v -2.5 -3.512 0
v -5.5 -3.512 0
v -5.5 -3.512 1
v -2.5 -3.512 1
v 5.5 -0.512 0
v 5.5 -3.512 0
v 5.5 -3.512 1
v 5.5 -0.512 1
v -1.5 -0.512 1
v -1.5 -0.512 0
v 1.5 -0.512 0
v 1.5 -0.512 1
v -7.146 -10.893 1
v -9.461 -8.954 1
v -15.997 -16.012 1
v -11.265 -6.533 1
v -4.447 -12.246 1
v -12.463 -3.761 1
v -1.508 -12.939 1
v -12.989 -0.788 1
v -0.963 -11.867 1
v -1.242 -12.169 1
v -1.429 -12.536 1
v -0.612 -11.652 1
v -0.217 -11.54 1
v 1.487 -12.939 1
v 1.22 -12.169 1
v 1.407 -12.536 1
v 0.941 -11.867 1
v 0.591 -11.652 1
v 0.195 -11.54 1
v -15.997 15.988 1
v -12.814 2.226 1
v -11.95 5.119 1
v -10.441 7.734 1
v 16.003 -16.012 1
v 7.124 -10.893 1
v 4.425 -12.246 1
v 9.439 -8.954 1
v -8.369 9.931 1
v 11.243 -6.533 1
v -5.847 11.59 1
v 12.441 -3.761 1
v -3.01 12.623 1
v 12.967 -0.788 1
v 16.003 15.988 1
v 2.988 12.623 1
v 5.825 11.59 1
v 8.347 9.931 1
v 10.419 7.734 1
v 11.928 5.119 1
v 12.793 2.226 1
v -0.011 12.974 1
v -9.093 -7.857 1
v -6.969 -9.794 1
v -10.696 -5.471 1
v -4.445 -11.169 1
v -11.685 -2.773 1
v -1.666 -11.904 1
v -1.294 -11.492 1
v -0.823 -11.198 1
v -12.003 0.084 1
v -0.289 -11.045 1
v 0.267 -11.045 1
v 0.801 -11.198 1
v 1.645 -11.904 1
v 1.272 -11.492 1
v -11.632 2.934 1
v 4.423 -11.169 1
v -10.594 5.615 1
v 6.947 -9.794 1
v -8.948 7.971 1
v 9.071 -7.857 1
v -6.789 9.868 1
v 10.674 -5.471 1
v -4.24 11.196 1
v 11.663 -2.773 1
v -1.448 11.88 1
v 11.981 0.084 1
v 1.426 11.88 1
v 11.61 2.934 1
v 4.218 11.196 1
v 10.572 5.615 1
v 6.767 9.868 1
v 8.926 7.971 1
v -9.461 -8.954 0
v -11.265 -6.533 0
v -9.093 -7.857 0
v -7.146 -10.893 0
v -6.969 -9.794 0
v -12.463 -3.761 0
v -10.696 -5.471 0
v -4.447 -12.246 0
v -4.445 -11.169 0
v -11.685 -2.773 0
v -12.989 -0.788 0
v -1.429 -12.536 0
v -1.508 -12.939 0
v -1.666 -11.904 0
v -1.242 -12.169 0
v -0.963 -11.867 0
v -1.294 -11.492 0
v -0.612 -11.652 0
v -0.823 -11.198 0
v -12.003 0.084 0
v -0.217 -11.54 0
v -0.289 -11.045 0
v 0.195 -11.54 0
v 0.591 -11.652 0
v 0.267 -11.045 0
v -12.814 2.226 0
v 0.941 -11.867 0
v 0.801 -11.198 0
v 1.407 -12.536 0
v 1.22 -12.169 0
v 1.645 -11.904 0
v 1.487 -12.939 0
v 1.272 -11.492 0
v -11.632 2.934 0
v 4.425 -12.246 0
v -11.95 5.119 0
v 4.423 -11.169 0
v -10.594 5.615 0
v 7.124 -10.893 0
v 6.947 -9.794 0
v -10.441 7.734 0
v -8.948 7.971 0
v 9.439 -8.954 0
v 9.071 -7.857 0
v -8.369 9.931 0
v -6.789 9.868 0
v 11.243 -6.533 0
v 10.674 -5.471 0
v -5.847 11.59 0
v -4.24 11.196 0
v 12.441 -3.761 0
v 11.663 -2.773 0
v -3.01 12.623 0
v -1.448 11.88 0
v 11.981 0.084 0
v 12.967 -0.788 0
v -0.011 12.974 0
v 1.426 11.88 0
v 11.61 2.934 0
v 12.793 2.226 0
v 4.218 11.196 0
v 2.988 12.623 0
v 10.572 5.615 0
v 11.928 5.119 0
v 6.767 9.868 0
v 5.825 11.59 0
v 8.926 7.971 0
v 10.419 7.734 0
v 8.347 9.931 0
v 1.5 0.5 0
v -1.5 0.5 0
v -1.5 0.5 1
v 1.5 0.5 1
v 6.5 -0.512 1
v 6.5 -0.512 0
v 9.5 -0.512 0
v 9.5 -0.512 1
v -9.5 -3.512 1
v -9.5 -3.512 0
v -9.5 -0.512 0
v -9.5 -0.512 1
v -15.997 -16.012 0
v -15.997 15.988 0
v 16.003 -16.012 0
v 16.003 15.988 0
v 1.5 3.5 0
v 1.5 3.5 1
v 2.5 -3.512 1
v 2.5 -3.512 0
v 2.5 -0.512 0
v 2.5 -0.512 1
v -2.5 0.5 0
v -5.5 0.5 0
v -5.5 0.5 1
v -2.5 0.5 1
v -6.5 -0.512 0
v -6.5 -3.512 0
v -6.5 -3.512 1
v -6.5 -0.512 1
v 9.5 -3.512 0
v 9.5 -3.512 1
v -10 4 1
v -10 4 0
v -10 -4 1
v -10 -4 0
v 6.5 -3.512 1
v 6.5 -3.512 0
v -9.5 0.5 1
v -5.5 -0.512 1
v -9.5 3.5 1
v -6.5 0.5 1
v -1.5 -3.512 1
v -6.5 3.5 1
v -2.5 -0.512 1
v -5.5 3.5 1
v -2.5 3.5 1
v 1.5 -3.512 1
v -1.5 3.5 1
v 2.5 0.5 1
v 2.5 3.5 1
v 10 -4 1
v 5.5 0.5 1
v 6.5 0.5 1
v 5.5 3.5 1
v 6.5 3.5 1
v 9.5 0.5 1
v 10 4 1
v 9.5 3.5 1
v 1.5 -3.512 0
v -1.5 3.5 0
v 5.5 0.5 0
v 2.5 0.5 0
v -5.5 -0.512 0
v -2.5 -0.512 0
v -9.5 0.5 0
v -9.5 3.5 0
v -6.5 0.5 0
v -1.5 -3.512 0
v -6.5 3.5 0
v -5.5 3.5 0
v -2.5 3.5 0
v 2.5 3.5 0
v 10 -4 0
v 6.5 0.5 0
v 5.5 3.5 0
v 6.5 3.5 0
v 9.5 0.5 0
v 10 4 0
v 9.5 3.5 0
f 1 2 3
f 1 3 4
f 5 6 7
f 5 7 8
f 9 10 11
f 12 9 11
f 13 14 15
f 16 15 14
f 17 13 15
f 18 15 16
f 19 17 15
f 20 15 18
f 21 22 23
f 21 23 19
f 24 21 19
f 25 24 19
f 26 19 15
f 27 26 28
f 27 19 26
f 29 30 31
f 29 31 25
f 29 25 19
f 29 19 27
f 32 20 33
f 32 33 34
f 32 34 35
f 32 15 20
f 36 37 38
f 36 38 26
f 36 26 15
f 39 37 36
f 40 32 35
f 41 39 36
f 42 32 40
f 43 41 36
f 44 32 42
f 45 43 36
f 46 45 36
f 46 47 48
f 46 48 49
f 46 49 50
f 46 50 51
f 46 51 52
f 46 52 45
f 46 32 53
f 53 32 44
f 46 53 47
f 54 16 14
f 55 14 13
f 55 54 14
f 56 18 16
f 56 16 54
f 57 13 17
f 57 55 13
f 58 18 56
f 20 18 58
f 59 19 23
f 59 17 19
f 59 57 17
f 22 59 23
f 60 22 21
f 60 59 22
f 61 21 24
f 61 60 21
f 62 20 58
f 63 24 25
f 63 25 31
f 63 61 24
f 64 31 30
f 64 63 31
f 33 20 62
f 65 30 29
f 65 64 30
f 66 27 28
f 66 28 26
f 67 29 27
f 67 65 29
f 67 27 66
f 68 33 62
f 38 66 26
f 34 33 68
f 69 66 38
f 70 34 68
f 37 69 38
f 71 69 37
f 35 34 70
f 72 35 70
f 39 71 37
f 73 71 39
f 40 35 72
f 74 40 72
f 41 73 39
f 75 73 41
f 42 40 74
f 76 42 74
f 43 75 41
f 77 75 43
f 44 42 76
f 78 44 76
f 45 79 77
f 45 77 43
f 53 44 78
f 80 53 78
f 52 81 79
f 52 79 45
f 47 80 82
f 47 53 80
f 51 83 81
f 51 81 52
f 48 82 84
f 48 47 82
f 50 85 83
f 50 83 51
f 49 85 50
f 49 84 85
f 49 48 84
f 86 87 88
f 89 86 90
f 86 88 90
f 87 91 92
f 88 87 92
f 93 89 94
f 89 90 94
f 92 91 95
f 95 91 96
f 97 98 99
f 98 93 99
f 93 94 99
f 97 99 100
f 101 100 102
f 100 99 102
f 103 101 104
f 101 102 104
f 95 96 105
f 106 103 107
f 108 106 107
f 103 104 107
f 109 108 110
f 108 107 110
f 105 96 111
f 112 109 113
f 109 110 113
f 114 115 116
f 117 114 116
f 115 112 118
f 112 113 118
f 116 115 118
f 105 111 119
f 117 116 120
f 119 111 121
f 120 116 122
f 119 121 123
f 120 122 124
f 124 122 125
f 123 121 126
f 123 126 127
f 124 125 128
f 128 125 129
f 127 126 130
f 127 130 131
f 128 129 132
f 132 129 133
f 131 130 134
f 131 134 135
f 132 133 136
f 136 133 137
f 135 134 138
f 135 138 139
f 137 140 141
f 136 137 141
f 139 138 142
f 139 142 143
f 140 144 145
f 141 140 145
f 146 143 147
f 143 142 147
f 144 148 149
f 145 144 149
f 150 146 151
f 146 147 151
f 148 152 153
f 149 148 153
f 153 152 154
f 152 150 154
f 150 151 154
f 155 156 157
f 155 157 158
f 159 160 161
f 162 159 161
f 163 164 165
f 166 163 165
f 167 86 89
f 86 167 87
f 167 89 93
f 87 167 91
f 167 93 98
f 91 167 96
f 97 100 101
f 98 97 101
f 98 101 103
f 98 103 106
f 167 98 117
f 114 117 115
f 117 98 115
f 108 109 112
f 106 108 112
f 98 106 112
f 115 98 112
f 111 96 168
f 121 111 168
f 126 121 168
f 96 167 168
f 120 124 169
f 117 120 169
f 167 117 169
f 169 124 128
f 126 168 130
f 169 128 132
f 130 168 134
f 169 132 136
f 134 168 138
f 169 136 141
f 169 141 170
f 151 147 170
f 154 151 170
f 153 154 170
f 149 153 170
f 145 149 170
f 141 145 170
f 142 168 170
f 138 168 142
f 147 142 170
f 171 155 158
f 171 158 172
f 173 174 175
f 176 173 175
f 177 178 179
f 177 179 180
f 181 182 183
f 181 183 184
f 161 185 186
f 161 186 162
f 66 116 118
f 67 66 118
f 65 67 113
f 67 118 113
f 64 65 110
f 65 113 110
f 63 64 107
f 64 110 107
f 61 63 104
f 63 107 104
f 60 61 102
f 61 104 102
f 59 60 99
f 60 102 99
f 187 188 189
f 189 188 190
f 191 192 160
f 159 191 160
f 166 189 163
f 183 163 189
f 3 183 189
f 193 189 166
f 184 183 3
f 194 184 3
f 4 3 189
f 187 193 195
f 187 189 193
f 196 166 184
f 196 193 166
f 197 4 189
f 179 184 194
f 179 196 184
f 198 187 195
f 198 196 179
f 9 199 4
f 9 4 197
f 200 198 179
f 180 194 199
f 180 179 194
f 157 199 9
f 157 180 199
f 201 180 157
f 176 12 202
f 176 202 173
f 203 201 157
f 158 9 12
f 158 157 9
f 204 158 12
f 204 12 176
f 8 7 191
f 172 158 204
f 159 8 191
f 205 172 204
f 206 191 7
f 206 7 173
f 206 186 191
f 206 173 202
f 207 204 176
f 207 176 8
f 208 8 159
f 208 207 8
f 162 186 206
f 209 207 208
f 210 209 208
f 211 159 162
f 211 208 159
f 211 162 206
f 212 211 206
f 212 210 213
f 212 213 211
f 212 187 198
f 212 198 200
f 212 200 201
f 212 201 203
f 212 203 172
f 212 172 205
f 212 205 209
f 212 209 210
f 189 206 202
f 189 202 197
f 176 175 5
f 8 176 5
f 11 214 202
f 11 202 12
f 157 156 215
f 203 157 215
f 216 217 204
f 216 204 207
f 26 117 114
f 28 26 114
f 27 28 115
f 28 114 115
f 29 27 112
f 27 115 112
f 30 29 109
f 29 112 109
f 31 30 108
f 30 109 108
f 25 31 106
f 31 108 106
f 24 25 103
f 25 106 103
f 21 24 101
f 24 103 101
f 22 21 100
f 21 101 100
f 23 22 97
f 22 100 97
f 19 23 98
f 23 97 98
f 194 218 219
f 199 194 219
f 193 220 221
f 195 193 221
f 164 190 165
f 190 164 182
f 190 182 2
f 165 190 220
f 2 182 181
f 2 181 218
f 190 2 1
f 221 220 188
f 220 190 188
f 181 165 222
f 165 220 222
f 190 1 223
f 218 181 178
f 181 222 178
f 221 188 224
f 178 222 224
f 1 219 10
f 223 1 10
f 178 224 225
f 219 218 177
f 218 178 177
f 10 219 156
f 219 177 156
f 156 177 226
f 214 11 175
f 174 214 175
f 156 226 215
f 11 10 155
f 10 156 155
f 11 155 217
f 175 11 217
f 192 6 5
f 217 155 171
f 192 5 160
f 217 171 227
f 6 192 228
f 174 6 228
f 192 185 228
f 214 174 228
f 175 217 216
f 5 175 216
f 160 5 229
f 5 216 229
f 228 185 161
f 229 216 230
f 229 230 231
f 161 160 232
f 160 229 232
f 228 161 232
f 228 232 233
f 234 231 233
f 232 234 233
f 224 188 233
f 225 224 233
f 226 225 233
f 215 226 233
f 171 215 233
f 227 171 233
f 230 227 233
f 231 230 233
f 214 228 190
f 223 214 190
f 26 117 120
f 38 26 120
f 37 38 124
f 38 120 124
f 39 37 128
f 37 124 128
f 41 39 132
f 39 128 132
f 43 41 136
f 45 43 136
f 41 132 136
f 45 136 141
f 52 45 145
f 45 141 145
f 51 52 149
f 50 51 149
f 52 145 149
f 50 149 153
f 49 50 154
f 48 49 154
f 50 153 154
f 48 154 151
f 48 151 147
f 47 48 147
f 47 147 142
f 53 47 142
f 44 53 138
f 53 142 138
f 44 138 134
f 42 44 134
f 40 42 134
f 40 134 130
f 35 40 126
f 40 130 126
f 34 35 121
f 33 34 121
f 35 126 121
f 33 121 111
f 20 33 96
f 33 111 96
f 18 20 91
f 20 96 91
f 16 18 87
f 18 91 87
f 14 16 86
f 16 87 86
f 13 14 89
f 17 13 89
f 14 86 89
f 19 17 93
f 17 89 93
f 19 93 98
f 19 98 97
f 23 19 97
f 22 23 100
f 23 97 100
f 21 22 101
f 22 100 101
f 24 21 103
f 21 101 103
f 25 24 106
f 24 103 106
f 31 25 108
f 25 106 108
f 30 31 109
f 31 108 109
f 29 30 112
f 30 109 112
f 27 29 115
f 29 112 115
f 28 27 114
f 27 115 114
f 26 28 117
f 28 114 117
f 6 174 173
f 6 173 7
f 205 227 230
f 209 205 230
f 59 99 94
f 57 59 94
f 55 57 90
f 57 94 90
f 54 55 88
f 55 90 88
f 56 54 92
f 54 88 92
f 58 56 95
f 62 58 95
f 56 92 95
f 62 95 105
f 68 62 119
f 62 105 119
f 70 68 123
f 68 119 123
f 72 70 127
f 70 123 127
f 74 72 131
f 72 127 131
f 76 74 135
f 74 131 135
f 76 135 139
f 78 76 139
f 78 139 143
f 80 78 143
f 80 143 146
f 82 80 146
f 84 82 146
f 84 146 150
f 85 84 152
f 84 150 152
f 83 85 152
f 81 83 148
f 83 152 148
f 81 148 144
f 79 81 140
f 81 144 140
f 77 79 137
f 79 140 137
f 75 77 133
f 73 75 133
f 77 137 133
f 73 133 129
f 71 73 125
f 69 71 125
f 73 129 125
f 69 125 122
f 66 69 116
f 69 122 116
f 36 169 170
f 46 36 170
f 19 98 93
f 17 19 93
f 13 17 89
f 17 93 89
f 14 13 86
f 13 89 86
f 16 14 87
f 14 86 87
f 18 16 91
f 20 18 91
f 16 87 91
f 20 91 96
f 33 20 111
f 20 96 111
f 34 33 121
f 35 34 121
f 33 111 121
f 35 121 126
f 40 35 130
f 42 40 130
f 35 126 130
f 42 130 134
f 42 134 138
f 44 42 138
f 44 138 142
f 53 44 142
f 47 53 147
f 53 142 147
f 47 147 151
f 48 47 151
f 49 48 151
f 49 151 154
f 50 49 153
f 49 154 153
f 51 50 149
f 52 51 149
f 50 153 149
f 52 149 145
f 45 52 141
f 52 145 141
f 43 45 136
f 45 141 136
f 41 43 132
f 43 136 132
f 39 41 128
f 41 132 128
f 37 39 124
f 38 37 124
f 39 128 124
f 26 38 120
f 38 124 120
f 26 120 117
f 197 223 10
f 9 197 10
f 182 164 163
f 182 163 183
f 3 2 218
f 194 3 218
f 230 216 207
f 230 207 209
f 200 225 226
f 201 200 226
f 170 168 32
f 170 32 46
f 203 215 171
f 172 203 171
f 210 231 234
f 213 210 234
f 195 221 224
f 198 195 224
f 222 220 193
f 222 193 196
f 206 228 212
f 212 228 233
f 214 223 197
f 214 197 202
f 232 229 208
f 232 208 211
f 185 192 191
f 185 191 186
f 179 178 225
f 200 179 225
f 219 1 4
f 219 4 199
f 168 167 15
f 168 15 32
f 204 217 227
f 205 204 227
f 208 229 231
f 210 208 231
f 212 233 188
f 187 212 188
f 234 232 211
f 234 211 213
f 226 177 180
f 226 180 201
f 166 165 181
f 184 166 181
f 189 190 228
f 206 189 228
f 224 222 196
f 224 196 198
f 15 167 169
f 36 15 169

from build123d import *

# Parameters (mm, degrees)
F0_W     = 3
F0_H     = 3
F1_DEPTH = 1
F0_W_2   = 32
F0_H_2   = 32
F2_DEPTH = 1


with BuildPart() as f1:
    # F0 (on Top) → F1 (new body)
    with BuildSketch(Plane.XY):
        Polygon((10, 3.5), (10, 4), (6.5, 4), (6, 4), (2.5, 4), (2, 4), (-1.5, 4), (-2, 4), (-5.5, 4), (-6, 4), (-6.5, 4), (-9.5, 4), (-10, 4), (-10, 3.5), (-10, -0.0124705449), (-10, -0.5124705449), (-10, -4), (-6.5, -4), (-6, -4), (-5.5, -4), (-2, -4), (-1.5, -4), (2, -4), (2.5, -4), (6, -4), (6.5, -4), (10, -4), (10, -0.5124705449), (10, -0.0124705449), align=None)
        with Locations((-8, -2.0124705449)):
            Rectangle(F0_W, F0_H, mode=Mode.SUBTRACT)
        with Locations((-4, -2.0124705449)):
            Rectangle(F0_W, F0_H, mode=Mode.SUBTRACT)
        with Locations((0, -2.0124705449)):
            Rectangle(F0_W, F0_H, mode=Mode.SUBTRACT)
        with Locations((4, -2.0124705449)):
            Rectangle(F0_W, F0_H, mode=Mode.SUBTRACT)
        with Locations((8, -2.0124705449)):
            Rectangle(F0_W, F0_H, mode=Mode.SUBTRACT)
        with Locations((-8, 2)):
            Rectangle(F0_W, F0_H, mode=Mode.SUBTRACT)
        with Locations((-4, 2)):
            Rectangle(F0_W, F0_H, mode=Mode.SUBTRACT)
        with Locations((0, 2)):
            Rectangle(F0_W, F0_H, mode=Mode.SUBTRACT)
        with Locations((4, 2)):
            Rectangle(F0_W, F0_H, mode=Mode.SUBTRACT)
        with Locations((8, 2)):
            Rectangle(F0_W, F0_H, mode=Mode.SUBTRACT)
    extrude(amount=F1_DEPTH)


with BuildPart() as f1b:
    # F0 (on Top) → F1, piece 2 (new body)
    with BuildSketch(Plane.XY):
        with BuildLine():
            ThreePointArc((-1.5083979477, -12.9394788722), (-0.0108963301, -11.5260173337), (1.4866052875, -12.9394788722))
            ThreePointArc((1.4866052875, -12.9394788722), (-0.0108963301, 12.9739826663), (-1.5083979477, -12.9394788722))
        make_face()
        with BuildLine():
            ThreePointArc((-1.6663219417, -11.9037134335), (-0.0108963301, 11.9664844317), (1.6445292815, -11.9037134335))
            ThreePointArc((1.6445292815, -11.9037134335), (-0.0108963301, -11.0260173337), (-1.6663219417, -11.9037134335))
        make_face(mode=Mode.SUBTRACT)
    extrude(amount=F1_DEPTH)


with BuildPart() as f2:
    # F0 (on Top) → F2 (new body)
    with BuildSketch(Plane.XY):
        with Locations((0.0026504587, -0.0124705449)):
            Rectangle(F0_W_2, F0_H_2)
        with BuildLine():
            ThreePointArc((-1.5083979477, -12.9394788722), (-0.0108963301, 12.9739826663), (1.4866052875, -12.9394788722))
            ThreePointArc((1.4866052875, -12.9394788722), (-0.0108963301, -11.5260173337), (-1.5083979477, -12.9394788722))
        make_face(mode=Mode.SUBTRACT)
    extrude(amount=F2_DEPTH)


solid = Compound([f1.part, f1b.part, f2.part])
